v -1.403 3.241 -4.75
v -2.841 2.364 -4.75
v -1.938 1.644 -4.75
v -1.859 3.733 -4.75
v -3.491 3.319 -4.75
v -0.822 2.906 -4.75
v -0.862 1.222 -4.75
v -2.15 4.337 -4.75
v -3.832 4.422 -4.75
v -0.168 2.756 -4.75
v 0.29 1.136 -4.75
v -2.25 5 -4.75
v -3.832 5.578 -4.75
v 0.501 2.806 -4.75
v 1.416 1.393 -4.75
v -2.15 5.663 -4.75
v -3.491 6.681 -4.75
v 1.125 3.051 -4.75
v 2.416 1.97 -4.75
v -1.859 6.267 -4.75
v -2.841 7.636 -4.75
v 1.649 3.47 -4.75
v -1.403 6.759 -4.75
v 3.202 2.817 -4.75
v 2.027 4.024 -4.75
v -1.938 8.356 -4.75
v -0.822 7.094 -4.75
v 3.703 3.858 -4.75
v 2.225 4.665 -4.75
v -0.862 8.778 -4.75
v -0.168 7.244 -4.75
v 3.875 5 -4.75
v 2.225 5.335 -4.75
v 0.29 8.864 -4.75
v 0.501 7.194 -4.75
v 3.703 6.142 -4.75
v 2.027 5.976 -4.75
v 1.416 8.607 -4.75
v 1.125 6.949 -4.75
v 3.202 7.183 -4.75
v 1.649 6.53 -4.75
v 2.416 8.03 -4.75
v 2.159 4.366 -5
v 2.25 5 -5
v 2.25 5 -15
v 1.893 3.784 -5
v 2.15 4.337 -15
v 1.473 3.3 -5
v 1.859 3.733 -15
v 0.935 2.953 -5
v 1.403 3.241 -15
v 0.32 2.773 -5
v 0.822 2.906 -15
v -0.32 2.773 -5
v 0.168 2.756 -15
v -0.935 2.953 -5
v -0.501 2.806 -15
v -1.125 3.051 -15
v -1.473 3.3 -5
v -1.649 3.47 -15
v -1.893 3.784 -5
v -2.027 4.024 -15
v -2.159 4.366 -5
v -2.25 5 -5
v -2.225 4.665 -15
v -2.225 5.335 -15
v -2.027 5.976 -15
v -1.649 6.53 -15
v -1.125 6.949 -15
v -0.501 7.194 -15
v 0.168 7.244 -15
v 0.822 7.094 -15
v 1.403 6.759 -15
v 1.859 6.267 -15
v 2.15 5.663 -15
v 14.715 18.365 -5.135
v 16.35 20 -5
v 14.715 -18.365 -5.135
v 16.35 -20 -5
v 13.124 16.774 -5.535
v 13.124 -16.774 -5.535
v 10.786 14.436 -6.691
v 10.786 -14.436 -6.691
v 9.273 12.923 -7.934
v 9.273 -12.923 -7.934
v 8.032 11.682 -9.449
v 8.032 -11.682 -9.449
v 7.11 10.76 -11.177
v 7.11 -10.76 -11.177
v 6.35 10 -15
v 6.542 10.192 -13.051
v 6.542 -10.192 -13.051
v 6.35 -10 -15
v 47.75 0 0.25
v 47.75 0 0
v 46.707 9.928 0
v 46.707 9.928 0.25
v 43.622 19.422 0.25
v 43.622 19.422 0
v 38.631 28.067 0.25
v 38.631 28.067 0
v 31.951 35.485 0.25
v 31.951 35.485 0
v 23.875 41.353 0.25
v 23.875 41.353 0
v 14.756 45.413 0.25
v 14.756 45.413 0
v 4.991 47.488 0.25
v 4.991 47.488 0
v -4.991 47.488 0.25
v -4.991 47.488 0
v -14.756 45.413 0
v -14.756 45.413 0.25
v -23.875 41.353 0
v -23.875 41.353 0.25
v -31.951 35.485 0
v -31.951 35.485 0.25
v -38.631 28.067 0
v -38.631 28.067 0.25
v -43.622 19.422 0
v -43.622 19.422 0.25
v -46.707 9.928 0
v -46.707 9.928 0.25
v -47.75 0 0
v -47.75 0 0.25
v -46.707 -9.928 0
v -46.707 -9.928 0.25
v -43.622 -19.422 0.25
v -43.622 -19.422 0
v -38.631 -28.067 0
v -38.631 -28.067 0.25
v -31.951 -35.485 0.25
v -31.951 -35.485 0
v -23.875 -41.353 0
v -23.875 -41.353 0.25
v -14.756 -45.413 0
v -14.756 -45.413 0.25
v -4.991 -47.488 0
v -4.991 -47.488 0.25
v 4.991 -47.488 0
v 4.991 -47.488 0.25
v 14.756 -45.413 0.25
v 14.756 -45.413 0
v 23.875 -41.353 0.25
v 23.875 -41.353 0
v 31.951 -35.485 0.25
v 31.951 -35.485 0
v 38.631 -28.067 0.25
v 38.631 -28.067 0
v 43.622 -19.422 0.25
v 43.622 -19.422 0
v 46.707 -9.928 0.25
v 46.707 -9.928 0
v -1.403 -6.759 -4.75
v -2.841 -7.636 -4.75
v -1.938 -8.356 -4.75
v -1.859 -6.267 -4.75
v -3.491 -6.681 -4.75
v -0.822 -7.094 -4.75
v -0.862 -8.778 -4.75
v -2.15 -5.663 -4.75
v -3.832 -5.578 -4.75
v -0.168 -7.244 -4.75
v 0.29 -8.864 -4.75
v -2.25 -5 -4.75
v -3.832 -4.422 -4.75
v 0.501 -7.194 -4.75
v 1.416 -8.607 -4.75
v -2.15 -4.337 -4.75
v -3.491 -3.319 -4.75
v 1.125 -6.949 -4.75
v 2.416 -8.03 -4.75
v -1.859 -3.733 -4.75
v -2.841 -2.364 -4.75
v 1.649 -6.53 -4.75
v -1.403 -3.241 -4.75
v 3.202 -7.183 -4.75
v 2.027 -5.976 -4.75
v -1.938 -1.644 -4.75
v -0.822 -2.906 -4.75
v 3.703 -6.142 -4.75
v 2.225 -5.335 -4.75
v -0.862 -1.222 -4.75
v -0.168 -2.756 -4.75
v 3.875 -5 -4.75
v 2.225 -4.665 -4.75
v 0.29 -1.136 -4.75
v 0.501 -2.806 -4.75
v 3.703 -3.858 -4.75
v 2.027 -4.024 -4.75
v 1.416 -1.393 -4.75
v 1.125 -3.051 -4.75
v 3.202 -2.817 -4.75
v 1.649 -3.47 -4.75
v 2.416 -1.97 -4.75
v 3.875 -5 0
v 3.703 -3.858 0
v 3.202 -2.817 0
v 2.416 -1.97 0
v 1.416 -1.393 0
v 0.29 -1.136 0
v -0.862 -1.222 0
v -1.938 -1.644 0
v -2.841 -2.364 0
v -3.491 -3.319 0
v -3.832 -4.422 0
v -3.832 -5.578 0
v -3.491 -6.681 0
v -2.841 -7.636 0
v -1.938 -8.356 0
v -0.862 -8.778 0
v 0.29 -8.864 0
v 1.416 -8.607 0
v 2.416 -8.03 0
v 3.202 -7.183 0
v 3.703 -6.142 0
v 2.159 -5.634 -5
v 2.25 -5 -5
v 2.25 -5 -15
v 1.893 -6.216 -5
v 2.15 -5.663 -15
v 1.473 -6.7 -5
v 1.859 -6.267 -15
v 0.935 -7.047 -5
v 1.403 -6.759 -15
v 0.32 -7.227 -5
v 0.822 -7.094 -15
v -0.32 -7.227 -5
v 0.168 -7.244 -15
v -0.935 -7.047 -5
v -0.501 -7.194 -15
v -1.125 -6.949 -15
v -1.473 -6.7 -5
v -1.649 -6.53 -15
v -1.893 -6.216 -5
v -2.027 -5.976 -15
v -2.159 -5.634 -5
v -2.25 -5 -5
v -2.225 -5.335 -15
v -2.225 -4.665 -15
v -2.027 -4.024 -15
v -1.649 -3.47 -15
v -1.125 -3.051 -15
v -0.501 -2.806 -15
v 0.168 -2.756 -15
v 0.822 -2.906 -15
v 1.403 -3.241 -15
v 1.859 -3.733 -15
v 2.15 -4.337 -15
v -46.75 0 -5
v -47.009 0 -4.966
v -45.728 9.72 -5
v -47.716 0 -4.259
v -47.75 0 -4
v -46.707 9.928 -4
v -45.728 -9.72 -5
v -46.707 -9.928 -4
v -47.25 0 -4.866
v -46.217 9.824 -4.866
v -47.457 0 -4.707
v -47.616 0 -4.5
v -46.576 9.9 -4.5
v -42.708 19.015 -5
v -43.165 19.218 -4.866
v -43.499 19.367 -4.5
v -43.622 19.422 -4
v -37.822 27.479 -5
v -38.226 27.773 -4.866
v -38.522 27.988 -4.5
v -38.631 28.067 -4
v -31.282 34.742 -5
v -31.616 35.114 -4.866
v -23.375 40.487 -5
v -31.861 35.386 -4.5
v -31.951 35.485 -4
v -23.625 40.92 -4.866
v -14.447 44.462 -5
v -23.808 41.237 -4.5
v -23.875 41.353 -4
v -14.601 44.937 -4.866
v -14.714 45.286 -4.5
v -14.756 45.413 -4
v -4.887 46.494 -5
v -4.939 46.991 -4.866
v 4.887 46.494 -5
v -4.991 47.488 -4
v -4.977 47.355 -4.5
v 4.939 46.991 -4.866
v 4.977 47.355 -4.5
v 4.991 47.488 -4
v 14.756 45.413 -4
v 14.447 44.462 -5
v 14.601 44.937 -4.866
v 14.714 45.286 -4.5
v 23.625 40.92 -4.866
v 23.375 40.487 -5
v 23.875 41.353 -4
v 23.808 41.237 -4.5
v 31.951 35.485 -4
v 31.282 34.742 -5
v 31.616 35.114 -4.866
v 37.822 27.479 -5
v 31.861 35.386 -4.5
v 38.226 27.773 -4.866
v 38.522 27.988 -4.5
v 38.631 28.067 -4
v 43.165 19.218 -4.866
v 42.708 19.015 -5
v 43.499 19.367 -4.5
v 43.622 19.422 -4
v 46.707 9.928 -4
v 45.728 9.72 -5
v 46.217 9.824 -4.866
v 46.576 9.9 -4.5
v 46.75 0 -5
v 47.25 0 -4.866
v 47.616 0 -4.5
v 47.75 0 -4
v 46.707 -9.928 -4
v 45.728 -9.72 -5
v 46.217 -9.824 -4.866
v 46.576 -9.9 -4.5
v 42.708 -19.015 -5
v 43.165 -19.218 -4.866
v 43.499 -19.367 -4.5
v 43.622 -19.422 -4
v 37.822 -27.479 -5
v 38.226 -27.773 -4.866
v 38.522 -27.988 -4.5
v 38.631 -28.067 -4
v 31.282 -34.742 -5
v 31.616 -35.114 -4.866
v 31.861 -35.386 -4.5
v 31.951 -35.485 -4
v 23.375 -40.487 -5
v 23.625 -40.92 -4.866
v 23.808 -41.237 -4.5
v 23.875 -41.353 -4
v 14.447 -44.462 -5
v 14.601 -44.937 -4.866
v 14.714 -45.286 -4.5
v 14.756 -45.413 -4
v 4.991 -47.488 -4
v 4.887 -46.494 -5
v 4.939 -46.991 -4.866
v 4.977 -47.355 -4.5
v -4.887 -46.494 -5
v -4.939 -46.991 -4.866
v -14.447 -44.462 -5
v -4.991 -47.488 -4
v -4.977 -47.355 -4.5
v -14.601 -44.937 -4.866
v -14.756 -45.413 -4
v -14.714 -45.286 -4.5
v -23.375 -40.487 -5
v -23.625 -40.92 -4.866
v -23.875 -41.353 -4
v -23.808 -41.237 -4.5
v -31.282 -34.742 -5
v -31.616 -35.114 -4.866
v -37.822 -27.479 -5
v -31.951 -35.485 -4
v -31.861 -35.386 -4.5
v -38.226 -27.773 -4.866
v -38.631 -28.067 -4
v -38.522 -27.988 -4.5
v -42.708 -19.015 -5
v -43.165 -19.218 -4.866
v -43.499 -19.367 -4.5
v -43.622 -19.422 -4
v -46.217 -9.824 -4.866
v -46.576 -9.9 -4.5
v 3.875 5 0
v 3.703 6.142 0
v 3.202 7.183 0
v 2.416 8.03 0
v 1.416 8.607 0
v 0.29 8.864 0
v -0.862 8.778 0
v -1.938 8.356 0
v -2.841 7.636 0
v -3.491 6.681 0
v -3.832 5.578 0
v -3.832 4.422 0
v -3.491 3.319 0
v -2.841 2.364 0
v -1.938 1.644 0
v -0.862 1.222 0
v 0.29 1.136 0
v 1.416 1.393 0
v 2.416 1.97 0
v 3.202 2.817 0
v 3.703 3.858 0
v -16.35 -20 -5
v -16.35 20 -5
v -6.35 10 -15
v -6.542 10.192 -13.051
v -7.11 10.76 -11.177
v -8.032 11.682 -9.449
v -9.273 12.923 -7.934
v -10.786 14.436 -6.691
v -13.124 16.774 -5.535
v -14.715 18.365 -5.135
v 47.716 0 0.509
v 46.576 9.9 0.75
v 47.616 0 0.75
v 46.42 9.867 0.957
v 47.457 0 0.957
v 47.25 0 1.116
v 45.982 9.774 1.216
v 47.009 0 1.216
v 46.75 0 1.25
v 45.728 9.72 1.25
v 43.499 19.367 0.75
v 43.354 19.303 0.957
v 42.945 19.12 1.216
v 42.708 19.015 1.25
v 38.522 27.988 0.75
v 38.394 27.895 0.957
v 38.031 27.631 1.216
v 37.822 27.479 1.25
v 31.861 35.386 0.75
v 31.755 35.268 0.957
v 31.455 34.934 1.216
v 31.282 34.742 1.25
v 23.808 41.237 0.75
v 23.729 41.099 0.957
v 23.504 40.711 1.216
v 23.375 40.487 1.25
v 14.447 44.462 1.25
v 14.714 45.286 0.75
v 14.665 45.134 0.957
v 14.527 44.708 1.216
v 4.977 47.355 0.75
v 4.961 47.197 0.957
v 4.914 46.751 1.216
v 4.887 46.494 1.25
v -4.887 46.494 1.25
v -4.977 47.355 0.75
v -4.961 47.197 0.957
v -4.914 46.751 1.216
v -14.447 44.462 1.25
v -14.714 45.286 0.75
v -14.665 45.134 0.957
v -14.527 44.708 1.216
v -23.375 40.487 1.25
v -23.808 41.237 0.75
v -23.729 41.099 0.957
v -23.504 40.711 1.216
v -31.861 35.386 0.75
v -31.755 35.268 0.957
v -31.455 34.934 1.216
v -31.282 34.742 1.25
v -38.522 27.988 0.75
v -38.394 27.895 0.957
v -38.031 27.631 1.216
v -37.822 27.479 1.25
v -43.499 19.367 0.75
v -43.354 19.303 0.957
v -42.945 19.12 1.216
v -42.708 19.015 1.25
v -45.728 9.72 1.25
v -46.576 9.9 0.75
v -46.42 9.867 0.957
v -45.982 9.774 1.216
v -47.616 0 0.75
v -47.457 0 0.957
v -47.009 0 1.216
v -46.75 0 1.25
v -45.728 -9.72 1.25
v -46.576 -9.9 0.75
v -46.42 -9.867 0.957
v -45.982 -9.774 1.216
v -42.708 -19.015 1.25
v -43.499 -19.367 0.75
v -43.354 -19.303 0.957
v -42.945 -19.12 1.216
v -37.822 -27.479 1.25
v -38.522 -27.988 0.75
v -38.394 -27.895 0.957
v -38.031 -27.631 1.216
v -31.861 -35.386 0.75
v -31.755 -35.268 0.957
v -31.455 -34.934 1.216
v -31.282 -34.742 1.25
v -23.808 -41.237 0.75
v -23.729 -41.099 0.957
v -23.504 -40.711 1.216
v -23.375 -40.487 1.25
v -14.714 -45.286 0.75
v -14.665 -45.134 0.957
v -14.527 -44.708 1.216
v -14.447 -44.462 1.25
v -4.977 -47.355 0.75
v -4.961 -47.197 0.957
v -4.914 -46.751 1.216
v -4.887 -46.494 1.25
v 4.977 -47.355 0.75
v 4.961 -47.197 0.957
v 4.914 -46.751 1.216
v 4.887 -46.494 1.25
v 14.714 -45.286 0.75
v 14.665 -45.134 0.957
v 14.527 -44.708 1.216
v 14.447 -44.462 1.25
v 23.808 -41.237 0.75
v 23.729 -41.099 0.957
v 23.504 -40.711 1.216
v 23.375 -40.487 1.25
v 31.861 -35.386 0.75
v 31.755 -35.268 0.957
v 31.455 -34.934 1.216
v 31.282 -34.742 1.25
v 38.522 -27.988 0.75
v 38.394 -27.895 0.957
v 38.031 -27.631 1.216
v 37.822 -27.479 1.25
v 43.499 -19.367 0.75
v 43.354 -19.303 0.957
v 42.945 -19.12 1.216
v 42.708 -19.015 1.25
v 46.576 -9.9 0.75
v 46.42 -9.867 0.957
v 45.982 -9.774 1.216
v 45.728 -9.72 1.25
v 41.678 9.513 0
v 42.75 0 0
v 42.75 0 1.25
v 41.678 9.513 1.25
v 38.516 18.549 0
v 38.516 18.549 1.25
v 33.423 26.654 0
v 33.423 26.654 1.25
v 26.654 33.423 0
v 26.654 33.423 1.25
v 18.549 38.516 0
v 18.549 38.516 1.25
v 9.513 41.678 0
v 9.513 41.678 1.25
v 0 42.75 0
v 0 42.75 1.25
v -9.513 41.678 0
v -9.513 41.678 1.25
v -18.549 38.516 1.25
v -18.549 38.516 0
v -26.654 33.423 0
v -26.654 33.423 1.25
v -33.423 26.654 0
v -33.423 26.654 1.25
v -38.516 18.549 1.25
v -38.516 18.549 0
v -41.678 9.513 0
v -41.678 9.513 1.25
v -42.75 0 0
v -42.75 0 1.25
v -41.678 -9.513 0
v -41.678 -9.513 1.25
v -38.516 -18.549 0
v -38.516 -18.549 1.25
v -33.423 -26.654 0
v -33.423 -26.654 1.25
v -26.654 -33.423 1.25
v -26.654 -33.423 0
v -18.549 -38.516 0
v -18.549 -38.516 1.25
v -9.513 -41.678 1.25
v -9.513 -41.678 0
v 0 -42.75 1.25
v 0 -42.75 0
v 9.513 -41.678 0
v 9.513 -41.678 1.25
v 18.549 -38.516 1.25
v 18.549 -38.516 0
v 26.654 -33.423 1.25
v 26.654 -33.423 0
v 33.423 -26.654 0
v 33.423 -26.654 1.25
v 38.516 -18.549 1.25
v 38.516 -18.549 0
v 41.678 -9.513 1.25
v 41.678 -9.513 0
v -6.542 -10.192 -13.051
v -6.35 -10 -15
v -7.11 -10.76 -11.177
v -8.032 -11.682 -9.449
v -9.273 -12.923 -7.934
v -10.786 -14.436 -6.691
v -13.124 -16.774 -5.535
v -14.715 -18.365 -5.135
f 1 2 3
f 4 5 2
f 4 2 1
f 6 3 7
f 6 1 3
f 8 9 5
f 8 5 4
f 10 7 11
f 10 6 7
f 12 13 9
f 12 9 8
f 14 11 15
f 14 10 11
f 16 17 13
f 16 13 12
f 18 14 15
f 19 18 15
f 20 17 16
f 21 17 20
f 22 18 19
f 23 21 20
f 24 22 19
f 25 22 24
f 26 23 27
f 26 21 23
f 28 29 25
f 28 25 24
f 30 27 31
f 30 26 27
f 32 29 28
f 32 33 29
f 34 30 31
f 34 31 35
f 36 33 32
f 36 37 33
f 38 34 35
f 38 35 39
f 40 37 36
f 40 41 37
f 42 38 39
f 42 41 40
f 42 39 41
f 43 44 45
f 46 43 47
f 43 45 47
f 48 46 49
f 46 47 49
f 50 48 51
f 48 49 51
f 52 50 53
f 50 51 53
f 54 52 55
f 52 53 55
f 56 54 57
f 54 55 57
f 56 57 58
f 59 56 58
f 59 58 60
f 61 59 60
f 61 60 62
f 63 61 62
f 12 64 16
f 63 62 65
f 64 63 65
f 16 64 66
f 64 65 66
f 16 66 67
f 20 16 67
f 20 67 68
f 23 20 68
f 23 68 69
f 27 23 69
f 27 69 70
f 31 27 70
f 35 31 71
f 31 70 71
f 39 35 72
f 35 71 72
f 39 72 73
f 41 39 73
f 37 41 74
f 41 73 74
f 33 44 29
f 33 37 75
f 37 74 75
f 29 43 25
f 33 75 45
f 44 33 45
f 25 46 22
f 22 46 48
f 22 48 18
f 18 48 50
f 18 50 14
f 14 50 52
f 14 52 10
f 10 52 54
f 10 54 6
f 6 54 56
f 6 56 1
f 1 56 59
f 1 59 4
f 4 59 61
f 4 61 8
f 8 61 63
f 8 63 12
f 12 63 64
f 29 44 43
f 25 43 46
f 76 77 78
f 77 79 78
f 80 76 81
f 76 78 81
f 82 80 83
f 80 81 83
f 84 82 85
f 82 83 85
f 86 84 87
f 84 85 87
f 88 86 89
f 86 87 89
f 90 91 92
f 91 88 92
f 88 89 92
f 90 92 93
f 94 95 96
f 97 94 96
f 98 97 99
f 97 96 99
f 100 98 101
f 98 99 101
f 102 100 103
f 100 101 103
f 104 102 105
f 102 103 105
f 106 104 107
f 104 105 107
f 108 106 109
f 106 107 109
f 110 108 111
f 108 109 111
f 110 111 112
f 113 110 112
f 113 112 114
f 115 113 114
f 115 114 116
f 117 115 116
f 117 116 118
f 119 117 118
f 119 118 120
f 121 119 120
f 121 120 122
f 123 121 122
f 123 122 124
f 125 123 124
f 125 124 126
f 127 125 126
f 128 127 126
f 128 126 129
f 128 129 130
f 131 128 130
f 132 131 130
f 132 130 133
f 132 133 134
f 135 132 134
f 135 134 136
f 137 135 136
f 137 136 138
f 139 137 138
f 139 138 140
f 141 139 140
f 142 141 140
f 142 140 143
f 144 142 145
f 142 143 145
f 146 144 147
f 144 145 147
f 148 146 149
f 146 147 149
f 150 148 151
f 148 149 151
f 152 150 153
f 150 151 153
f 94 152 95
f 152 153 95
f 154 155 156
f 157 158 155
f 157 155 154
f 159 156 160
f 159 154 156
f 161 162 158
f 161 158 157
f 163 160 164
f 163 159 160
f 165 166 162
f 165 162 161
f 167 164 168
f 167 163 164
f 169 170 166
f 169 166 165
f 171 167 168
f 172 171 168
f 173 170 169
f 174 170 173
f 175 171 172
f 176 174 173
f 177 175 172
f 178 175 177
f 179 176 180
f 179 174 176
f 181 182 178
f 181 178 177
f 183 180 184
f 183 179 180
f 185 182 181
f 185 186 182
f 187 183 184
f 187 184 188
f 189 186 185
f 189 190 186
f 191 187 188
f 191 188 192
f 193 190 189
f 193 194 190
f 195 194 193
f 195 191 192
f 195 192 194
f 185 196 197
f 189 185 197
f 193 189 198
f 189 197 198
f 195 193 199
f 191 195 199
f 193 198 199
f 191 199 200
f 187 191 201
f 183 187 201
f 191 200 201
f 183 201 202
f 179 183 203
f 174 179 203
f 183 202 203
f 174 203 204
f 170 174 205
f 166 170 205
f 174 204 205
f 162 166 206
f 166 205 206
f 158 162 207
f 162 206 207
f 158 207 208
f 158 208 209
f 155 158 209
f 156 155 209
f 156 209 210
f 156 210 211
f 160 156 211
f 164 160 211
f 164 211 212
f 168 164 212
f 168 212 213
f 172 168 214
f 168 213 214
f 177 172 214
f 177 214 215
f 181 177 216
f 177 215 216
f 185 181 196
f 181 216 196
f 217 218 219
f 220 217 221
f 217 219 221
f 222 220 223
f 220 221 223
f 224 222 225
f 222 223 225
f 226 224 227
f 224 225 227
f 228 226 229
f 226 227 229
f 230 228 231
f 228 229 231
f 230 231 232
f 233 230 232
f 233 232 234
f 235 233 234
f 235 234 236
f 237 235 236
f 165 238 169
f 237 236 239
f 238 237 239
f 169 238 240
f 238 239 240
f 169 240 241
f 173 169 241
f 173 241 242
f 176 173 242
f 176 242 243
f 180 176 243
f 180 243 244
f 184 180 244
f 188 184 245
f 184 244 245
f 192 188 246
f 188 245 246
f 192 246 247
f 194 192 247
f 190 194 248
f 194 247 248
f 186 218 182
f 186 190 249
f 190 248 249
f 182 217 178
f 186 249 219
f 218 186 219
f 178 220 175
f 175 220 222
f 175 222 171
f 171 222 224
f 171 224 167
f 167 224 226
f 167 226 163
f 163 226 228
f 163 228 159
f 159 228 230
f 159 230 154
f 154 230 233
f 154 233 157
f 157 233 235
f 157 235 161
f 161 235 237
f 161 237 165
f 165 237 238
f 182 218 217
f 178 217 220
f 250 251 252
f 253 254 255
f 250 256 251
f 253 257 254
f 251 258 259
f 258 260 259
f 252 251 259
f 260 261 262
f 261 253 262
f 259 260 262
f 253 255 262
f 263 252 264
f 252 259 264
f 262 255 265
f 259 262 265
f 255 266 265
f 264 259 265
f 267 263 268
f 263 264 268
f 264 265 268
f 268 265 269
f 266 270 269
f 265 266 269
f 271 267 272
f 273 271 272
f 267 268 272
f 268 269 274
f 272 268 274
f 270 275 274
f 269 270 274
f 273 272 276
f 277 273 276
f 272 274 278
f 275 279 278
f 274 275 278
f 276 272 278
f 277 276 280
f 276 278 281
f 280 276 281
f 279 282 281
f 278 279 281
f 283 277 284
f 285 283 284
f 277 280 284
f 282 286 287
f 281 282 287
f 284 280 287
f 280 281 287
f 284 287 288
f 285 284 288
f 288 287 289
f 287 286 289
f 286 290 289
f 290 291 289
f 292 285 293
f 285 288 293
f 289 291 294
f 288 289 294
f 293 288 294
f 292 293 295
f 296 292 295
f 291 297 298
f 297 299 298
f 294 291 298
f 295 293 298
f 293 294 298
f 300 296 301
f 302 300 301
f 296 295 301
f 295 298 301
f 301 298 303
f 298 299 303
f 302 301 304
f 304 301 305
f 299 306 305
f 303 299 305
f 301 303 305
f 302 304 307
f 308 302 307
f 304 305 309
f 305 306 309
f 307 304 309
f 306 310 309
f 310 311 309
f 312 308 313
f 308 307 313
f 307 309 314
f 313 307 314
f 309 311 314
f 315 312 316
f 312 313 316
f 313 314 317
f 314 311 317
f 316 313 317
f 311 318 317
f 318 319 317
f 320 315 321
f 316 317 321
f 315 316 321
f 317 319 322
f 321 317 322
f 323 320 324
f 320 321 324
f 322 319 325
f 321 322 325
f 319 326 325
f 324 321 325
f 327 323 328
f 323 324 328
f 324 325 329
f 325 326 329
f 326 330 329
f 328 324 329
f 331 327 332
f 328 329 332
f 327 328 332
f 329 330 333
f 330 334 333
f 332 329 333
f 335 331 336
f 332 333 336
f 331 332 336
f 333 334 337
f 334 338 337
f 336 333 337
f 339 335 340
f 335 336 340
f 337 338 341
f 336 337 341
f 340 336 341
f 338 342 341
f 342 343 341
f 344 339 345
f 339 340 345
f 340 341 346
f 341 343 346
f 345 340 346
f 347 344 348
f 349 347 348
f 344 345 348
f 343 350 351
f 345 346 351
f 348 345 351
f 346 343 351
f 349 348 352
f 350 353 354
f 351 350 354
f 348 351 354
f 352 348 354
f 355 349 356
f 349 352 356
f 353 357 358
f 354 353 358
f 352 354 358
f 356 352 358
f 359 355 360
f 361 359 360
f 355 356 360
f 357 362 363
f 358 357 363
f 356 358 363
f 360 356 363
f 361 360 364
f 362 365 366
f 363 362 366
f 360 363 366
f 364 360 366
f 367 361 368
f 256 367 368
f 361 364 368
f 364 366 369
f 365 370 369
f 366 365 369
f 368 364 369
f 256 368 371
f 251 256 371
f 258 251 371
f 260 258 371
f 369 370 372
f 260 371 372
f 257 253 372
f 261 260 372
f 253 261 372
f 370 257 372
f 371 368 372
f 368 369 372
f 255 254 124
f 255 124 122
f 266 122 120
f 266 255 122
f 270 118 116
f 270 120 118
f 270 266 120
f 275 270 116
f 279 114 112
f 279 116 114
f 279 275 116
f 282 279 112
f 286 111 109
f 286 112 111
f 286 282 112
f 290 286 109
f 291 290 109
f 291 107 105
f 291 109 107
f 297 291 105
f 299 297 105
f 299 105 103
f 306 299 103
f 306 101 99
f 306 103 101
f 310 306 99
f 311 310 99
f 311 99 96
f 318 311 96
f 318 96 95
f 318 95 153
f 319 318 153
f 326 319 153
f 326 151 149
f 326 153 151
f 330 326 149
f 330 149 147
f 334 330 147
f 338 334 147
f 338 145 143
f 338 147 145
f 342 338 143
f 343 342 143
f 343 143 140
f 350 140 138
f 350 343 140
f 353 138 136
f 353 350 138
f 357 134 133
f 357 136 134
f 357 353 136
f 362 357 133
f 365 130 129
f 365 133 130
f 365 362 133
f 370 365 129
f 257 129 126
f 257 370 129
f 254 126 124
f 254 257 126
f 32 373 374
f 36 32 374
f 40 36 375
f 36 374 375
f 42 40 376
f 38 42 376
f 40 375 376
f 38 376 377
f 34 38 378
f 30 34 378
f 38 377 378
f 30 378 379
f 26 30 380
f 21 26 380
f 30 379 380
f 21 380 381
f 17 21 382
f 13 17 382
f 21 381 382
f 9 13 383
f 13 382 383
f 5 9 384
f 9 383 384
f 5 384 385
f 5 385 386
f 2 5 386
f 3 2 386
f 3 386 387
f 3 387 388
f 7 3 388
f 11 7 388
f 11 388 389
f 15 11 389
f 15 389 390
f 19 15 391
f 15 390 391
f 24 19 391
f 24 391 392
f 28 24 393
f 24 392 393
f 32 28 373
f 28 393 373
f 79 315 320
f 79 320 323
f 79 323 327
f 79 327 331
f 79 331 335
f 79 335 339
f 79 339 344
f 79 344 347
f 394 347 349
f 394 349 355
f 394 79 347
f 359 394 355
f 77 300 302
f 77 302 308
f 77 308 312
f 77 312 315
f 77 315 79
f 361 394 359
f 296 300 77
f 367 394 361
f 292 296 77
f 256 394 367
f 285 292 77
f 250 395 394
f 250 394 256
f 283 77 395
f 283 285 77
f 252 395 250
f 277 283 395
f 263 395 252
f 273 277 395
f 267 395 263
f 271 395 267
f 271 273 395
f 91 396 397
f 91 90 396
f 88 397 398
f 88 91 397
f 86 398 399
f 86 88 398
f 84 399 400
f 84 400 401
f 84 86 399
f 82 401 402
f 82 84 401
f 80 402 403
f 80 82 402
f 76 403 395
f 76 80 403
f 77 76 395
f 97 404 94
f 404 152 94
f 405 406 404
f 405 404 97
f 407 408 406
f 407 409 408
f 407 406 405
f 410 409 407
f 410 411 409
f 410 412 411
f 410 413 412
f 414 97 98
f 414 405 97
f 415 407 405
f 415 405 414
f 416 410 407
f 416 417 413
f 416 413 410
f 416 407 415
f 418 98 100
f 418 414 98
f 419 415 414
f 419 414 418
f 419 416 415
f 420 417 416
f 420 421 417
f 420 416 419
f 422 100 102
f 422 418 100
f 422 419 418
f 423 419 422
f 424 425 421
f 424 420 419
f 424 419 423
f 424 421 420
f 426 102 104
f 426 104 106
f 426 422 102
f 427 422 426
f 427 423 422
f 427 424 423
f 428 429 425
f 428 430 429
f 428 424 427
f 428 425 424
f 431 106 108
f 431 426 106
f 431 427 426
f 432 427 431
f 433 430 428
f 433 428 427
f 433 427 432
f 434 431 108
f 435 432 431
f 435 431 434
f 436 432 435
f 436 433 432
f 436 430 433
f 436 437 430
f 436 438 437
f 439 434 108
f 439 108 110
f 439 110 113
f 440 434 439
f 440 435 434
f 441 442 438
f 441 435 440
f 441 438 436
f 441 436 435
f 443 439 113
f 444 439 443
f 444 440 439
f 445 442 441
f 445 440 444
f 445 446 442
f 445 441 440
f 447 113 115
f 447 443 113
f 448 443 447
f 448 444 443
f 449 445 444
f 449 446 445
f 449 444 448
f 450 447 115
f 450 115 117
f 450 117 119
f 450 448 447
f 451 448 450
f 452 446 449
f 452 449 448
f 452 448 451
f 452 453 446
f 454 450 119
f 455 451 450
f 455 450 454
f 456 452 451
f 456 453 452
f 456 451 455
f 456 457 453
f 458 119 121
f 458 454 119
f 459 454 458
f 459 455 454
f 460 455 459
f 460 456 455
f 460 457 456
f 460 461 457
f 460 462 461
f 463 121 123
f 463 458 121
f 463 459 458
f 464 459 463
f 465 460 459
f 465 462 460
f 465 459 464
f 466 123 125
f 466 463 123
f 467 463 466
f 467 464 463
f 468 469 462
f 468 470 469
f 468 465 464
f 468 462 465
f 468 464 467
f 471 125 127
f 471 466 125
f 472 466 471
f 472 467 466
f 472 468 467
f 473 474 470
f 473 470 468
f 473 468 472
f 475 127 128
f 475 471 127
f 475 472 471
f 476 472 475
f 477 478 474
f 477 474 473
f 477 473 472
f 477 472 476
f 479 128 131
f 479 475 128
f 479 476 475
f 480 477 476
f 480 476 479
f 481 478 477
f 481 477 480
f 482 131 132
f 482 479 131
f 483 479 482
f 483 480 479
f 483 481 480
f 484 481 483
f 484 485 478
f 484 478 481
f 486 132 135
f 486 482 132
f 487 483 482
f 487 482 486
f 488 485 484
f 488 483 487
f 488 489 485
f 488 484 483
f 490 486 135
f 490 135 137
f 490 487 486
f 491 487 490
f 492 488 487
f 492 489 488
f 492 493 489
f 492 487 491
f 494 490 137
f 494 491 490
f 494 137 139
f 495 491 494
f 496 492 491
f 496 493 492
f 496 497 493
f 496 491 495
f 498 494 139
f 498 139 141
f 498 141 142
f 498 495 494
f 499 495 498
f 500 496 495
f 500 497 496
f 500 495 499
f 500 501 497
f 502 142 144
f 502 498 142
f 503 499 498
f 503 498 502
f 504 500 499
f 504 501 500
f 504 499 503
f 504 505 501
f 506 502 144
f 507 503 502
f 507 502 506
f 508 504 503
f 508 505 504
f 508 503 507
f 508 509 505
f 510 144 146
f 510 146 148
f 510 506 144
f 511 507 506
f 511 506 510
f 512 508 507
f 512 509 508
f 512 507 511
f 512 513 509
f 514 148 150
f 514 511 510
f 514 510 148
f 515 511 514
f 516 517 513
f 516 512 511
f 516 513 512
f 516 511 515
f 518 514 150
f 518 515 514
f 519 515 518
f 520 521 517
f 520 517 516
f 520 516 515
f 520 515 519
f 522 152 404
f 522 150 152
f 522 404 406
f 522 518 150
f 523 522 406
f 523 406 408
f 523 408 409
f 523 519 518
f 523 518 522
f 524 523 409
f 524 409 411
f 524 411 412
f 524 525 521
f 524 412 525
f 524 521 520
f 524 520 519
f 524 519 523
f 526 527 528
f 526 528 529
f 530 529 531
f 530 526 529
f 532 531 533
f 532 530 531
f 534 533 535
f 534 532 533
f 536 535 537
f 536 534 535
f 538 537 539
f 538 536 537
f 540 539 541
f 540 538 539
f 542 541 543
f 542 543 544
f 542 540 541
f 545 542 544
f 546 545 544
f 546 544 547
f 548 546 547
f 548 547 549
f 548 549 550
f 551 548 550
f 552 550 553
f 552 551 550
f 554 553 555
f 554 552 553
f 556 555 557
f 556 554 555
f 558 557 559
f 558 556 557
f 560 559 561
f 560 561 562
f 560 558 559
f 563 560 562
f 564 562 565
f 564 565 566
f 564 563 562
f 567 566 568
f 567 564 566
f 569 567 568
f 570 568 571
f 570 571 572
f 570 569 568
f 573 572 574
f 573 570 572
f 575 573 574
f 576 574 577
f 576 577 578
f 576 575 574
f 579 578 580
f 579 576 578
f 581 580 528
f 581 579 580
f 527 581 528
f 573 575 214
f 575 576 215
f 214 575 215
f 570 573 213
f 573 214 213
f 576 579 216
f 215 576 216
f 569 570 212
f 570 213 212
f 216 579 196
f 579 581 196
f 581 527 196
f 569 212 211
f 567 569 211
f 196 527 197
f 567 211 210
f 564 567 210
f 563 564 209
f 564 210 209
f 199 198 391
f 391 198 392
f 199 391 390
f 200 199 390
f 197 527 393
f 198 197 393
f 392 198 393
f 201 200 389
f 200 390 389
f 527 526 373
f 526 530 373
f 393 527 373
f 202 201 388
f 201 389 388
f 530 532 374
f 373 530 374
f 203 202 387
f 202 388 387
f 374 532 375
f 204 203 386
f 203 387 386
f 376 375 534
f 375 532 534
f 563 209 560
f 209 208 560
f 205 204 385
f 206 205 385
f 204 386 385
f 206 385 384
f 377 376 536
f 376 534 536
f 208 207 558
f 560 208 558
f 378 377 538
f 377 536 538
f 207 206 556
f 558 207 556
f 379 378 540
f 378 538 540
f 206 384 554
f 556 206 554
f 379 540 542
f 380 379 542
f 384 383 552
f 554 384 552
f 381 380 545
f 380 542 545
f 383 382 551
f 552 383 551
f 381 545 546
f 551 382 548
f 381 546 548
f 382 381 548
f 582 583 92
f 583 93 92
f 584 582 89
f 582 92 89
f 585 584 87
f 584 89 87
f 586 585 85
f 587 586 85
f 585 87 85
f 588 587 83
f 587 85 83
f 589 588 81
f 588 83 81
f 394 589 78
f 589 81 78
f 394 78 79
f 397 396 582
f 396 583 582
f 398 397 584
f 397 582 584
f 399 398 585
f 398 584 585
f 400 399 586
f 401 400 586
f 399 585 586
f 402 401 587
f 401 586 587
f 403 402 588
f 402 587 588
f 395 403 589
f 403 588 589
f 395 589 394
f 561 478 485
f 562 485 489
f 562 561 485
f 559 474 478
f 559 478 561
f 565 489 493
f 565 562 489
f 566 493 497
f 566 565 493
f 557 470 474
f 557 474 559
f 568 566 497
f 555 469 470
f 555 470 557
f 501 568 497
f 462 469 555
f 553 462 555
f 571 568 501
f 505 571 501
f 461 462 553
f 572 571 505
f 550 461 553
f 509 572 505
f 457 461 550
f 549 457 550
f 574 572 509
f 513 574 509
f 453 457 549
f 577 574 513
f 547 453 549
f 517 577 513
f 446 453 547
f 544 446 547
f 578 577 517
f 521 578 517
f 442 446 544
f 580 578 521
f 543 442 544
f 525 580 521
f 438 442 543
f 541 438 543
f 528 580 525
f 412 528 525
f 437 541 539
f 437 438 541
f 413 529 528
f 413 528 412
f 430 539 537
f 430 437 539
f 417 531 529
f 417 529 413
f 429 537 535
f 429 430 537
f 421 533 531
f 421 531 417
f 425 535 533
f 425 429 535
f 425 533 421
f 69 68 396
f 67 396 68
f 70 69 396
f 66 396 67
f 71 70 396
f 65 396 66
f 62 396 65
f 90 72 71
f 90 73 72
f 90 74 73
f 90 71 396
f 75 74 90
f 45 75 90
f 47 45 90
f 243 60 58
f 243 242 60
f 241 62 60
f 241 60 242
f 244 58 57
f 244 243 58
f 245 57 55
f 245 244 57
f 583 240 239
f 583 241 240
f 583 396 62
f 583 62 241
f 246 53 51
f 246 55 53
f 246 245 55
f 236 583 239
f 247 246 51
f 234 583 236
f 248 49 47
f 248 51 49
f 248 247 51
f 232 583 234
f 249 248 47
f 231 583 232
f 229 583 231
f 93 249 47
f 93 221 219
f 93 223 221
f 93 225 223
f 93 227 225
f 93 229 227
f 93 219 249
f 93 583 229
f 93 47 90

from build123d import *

# Parameters (mm, degrees)
SKETCH1_R           = 47.75
SKETCH1_R_2         = 42.75
BOSS_EXTRUDE1_DEPTH = 1.25
BOSS_EXTRUDE2_START = 5
SKETCH2_R           = 47.75
SKETCH2_R_2         = 2.25
BOSS_EXTRUDE2_DEPTH = 5
SKETCH3_R           = 3.875
CUT_EXTRUDE1_DEPTH  = 4.75
BOSS_EXTRUDE3_START = 10
SKETCH4_W           = 12.7
SKETCH4_H           = 20
SKETCH4_R           = 2.25
BOSS_EXTRUDE3_DEPTH = 10
FILLET1_R           = 10
FILLET2_R           = 1


with BuildPart() as part:
    # Sketch1 → Boss-Extrude1 (new body)
    with BuildSketch(Plane(origin=(0, 0, 0), x_dir=(0, 1, 0), z_dir=(0, 0, 1))):
        with Locations(Location((0, 0, 0), (0, 0, 270))):
            Circle(SKETCH1_R)
        with Locations(Location((0, 0, 0), (0, 0, 270))):
            Circle(SKETCH1_R_2, mode=Mode.SUBTRACT)
    extrude(amount=BOSS_EXTRUDE1_DEPTH)

    # Sketch2 → Boss-Extrude2 (add)
    with BuildSketch(Plane(origin=(0, 0, 0), x_dir=(1, 0, 0), z_dir=(0, 0, -1)).offset(BOSS_EXTRUDE2_START)):
        with Locations(Location((0, 0, 0), (0, 0, 180))):
            Circle(SKETCH2_R)
        with Locations(Location((0, 5, 0), (0, 0, 180))):
            Circle(SKETCH2_R_2, mode=Mode.SUBTRACT)
        with Locations(Location((0, -5, 0), (0, 0, 180))):
            Circle(SKETCH2_R_2, mode=Mode.SUBTRACT)
    extrude(amount=-BOSS_EXTRUDE2_DEPTH)

    # Sketch3 → Cut-Extrude1 (cut)
    with BuildSketch(Plane.XY):
        with Locations((0, 5)):
            Circle(SKETCH3_R)
        with Locations((0, -5)):
            Circle(SKETCH3_R)
    extrude(amount=-CUT_EXTRUDE1_DEPTH, mode=Mode.SUBTRACT)

    # Sketch4 → Boss-Extrude3 (add)
    with BuildSketch(Plane(origin=(0, 0, -5), x_dir=(1, 0, 0), z_dir=(0, 0, -1)).offset(BOSS_EXTRUDE3_START)):
        Rectangle(SKETCH4_W, SKETCH4_H)
        with Locations((0, 5)):
            Circle(SKETCH4_R, mode=Mode.SUBTRACT)
        with Locations((0, -5)):
            Circle(SKETCH4_R, mode=Mode.SUBTRACT)
    extrude(amount=-BOSS_EXTRUDE3_DEPTH)

    # Fillet1
    fillet1_edges = [part.edges().sort_by_distance(p)[0] for p in [
        (0, -10, -5),
        (-6.35, 0, -5),
        (0, 10, -5),
        (6.35, 0, -5),
    ]]
    fillet(fillet1_edges, radius=FILLET1_R - 0.0001)  # a hair under: the kernel refuses the full size

    # Fillet2
    fillet2_edges = [part.edges().sort_by_distance(p)[0] for p in [
        (47.75, 0, -5),
        (-47.75, 0, 1.25),
    ]]
    fillet(fillet2_edges, radius=FILLET2_R)


solid = part.part
